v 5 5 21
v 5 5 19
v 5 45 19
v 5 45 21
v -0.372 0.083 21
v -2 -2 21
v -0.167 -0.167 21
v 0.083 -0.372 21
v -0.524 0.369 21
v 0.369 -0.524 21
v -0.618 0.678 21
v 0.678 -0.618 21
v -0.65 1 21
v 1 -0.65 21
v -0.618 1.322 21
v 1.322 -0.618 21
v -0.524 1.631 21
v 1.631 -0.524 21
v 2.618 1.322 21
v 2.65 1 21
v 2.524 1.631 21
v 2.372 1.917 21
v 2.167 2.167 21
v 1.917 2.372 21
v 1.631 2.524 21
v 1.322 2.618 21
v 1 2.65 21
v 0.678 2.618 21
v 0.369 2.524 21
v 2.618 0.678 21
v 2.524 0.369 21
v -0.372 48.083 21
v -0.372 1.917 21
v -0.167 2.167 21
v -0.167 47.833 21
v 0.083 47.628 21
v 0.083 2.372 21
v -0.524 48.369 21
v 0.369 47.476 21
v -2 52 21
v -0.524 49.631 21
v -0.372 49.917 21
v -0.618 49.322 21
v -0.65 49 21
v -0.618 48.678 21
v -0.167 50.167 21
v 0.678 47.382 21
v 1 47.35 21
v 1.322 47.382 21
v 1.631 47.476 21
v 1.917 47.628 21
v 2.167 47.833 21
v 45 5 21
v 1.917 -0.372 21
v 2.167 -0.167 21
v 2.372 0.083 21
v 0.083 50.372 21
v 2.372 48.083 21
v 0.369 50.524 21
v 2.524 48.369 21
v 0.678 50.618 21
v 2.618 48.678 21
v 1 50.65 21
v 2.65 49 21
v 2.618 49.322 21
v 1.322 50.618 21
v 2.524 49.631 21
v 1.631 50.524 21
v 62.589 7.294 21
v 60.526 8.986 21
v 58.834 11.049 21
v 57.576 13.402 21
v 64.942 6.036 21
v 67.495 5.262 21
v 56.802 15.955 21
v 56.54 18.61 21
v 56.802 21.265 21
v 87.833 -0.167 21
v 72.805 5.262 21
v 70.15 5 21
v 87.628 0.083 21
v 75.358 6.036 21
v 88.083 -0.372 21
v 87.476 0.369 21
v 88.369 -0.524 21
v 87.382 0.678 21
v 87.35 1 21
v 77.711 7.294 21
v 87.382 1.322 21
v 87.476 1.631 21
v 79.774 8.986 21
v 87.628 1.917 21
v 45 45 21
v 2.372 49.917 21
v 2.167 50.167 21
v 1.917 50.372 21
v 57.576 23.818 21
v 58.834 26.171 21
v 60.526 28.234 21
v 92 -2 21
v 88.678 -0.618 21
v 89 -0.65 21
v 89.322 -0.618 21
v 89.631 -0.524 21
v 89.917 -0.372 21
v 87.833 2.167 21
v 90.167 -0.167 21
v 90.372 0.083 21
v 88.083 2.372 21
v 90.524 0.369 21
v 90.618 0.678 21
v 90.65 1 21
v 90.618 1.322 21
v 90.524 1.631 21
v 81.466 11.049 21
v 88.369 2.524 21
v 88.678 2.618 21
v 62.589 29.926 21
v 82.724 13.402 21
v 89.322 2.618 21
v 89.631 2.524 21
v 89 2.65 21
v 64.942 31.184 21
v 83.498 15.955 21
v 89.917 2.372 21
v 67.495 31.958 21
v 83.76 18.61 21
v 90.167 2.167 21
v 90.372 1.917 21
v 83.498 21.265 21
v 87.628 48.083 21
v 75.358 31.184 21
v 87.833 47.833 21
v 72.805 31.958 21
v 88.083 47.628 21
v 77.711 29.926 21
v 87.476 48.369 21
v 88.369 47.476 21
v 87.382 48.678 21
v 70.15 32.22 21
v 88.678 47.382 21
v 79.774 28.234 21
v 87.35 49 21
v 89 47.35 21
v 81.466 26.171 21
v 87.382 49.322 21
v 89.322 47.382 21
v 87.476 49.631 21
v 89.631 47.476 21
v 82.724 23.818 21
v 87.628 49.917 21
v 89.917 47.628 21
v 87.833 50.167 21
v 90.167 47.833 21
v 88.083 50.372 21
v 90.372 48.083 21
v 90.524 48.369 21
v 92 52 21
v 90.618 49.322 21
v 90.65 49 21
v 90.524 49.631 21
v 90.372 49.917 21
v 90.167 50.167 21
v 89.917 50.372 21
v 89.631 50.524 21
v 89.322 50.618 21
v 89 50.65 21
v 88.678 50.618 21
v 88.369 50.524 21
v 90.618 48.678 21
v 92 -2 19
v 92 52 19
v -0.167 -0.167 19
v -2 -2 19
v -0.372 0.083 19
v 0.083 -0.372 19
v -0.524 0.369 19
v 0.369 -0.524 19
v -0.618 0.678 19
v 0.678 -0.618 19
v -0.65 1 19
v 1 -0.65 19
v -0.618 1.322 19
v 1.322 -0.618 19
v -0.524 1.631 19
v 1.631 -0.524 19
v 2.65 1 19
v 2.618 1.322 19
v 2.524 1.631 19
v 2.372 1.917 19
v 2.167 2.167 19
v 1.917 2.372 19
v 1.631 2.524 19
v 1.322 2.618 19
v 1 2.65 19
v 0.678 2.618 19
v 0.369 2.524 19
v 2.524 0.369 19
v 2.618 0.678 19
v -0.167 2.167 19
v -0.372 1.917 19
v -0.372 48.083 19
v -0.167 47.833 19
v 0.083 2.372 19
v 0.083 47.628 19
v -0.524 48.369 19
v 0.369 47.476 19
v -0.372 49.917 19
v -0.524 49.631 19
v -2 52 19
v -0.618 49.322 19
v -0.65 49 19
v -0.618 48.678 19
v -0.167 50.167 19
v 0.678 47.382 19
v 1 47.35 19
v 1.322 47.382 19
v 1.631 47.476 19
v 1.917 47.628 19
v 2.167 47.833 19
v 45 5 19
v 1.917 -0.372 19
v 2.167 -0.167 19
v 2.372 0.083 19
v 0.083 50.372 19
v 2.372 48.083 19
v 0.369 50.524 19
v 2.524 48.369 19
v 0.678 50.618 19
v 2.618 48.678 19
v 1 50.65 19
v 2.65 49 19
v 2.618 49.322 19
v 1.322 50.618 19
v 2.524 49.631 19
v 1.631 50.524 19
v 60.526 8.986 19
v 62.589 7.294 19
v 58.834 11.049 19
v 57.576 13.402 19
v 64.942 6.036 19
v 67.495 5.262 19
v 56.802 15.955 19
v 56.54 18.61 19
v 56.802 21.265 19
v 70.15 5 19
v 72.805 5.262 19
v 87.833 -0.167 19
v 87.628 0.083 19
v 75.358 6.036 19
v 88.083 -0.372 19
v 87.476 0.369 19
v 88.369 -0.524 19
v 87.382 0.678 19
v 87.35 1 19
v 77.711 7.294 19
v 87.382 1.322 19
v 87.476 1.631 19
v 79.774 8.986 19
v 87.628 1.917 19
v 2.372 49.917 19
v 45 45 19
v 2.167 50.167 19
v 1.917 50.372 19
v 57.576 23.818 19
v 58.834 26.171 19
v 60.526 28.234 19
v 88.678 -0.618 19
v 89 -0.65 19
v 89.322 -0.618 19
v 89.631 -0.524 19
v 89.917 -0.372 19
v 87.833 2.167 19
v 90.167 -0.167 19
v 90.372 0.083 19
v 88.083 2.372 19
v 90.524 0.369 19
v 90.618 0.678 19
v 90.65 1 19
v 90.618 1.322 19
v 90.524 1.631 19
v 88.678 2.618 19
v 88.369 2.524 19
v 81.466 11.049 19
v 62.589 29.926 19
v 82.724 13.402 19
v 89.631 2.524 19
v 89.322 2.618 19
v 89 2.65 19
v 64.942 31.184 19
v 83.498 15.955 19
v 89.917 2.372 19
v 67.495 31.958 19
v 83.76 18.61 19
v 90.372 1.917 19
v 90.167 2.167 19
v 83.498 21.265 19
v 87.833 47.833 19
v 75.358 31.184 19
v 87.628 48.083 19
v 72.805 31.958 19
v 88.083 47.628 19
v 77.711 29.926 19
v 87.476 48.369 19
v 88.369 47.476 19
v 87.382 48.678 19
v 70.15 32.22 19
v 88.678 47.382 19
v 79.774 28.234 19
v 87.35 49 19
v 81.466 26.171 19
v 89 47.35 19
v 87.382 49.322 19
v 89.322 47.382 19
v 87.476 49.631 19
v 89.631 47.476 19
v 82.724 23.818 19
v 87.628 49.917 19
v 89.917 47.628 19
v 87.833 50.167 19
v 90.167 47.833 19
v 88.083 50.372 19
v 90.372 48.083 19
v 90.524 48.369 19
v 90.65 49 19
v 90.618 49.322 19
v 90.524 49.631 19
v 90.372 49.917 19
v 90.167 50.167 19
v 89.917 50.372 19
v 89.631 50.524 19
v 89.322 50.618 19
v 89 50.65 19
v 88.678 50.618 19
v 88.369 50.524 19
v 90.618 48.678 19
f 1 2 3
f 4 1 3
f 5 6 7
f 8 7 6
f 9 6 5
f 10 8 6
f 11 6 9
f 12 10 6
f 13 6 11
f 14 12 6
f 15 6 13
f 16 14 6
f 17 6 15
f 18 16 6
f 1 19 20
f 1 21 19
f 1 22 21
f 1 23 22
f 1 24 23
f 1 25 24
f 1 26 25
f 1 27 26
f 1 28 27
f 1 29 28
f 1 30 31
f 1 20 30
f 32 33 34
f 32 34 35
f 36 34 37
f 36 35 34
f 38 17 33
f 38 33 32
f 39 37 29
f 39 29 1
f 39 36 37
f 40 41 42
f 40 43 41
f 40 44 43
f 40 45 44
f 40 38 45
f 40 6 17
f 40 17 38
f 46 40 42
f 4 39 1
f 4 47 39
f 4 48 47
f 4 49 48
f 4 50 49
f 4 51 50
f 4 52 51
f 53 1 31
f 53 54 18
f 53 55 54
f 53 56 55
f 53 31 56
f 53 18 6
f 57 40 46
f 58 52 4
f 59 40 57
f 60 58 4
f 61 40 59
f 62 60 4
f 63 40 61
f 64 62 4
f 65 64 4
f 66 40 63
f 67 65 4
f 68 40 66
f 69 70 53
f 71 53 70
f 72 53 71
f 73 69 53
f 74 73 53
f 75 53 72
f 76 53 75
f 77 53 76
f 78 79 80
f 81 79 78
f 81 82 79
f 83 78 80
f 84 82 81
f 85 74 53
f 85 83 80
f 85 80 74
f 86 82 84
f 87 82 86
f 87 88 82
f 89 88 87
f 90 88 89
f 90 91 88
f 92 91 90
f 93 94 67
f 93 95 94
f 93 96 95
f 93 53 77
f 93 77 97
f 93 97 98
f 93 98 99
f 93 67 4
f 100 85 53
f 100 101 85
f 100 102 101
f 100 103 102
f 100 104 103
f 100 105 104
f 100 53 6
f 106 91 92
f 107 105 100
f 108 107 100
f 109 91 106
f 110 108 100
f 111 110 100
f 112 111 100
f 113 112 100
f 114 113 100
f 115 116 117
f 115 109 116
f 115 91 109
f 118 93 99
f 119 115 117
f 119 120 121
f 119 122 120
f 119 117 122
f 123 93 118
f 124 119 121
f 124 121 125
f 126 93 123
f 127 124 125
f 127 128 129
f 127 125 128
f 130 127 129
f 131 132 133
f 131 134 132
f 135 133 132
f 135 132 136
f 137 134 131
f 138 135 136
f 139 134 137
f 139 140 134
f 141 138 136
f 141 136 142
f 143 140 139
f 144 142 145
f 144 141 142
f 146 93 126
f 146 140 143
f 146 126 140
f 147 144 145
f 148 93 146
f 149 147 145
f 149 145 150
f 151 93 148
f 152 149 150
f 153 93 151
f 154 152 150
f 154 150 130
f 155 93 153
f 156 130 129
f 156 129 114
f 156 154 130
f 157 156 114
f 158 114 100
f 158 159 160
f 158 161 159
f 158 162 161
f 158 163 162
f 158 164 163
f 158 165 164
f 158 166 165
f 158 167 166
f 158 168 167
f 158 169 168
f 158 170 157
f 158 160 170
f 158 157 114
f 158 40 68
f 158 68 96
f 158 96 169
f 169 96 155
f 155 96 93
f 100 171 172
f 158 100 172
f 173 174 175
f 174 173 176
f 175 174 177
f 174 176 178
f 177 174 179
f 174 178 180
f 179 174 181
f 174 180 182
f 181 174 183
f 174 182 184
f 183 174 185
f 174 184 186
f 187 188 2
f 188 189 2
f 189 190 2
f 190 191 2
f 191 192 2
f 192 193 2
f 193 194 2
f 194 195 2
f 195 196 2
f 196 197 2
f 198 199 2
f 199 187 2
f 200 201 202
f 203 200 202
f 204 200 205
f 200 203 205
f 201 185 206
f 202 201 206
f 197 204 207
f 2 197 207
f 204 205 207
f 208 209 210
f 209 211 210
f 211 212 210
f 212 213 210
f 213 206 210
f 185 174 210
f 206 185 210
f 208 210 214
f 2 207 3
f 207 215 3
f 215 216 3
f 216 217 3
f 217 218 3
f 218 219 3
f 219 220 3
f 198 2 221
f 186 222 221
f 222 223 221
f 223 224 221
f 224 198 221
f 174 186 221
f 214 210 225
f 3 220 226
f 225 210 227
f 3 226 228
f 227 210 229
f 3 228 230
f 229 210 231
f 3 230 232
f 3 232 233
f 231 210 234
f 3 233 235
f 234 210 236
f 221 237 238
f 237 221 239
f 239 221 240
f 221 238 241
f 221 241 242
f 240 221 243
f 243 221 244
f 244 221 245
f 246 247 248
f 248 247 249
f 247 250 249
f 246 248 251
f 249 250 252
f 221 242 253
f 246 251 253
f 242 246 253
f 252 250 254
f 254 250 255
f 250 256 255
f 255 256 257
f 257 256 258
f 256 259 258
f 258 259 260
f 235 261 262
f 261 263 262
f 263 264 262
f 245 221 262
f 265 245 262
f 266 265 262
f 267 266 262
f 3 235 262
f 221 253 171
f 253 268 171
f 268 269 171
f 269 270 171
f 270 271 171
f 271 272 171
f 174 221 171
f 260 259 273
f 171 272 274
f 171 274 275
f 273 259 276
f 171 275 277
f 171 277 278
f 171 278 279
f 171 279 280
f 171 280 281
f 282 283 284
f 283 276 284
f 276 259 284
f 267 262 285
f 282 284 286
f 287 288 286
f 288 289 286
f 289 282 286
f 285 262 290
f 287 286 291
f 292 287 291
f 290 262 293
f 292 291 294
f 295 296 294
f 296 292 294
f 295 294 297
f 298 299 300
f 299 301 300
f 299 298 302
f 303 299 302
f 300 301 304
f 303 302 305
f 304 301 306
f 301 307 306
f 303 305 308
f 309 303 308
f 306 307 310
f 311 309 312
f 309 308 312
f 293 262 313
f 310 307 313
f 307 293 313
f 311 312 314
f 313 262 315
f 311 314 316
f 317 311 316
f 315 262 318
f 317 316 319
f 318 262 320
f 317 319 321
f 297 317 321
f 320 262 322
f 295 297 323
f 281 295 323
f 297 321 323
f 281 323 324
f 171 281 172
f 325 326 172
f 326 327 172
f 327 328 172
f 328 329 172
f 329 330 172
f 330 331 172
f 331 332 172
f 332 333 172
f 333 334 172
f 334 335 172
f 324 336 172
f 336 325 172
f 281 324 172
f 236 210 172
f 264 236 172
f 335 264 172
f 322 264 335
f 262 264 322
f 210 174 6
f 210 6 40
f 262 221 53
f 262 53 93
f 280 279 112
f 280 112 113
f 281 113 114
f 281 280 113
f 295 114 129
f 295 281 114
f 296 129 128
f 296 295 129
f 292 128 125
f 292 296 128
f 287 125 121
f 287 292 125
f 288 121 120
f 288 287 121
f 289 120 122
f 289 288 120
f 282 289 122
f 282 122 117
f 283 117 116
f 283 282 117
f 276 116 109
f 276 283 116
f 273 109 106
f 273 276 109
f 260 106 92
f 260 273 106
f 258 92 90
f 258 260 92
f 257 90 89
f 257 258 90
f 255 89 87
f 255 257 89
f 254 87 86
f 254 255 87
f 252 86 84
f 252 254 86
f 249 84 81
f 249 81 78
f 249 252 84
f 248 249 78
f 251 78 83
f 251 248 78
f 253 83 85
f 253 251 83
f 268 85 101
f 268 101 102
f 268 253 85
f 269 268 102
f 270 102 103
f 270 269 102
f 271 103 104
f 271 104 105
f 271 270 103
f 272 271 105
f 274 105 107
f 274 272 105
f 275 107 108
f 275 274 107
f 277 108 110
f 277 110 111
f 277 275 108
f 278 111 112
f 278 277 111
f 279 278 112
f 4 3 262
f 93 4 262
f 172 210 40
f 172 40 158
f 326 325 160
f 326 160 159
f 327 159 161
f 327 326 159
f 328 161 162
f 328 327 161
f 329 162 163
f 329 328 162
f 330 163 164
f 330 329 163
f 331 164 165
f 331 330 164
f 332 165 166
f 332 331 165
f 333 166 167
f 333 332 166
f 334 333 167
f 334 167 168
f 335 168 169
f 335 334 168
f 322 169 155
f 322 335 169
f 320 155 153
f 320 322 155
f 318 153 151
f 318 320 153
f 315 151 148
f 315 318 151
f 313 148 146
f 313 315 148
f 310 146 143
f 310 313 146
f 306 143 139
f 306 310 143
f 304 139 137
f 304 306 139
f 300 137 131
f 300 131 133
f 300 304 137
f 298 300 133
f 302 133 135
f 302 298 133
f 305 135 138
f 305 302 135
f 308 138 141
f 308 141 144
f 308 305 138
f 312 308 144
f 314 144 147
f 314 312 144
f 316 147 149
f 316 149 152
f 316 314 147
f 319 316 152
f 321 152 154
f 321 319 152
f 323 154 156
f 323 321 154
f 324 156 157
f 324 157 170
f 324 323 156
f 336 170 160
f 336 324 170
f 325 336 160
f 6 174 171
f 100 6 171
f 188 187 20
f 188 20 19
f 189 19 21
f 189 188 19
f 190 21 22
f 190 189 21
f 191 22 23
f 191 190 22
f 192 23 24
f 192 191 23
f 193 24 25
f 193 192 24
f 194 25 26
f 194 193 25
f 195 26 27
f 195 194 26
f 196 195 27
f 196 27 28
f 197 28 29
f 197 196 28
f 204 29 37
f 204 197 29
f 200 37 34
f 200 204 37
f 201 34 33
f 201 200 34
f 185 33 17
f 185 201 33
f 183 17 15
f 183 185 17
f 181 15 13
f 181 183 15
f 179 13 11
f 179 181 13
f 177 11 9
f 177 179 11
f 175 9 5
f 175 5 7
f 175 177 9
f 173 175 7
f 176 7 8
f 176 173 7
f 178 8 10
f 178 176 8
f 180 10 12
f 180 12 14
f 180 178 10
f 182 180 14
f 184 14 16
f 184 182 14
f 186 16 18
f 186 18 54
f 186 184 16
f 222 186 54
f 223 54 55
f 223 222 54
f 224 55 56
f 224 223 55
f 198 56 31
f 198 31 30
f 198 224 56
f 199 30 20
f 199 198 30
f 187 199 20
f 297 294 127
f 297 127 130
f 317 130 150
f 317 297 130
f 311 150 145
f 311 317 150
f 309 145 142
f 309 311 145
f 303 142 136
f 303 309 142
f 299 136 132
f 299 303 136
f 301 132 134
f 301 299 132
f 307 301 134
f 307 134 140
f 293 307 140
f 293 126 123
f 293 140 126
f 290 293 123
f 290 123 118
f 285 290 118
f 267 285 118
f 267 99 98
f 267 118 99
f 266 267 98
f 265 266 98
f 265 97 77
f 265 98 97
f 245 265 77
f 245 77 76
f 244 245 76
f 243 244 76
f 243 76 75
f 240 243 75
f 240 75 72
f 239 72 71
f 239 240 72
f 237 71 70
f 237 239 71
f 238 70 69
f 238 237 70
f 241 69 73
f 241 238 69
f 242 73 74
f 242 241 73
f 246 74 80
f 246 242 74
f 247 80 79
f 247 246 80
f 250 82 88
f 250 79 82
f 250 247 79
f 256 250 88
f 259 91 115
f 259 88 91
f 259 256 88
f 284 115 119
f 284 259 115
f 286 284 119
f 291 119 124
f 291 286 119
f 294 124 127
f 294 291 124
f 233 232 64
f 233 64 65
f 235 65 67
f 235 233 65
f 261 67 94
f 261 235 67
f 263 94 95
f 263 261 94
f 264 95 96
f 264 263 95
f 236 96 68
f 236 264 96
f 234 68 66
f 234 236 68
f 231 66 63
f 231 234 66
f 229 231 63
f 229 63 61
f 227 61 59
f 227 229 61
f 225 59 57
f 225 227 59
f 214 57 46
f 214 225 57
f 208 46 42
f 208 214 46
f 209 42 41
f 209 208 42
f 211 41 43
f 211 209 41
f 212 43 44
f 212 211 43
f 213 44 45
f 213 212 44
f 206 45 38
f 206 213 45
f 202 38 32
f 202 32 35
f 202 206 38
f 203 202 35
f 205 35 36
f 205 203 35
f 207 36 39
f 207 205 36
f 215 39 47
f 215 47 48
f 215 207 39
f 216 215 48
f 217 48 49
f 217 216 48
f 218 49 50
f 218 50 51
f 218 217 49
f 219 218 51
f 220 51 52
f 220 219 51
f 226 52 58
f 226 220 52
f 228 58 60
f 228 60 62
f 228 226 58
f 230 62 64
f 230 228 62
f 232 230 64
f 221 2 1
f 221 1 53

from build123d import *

# Parameters (mm, degrees)
SKETCH018_R      = 11
EXTRUDE016_DEPTH = 11
SKETCH015_W      = 33.86
SKETCH015_H      = 26.75
SKETCH015_R      = 1.65
EXTRUDE017_DEPTH = 1.6
SKETCH016_W      = 17
SKETCH016_H      = 12.75
EXTRUDE018_DEPTH = 4.3
SKETCH017_R      = 13.61
EXTRUDE015_DEPTH = 19.27
SKETCH028_W      = 94
SKETCH028_H      = 54
SKETCH028_R      = 1.65
SKETCH028_W_2    = 40
SKETCH028_H_2    = 40
EXTRUDE028_DEPTH = 2


with BuildPart() as extrude_joystick_stick:
    # Sketch018 → Extrude016 (new body)
    with BuildSketch(Plane.XY):
        with Locations((16.975, 14)):
            Circle(SKETCH018_R)
    extrude(amount=EXTRUDE016_DEPTH)


with BuildPart() as extrude_joystick_stick_1:
    # Extrude016 placement: moved
    add(extrude_joystick_stick.part.moved(Location((0, 0, 20.87))))


with BuildPart() as extrude_joystick_base:
    # Sketch015 → Extrude017 (new body)
    with BuildSketch(Plane.XY):
        with Locations((16.93, 13.375)):
            Rectangle(SKETCH015_W, SKETCH015_H)
        with Locations((5, 22.88)):
            Circle(SKETCH015_R, mode=Mode.SUBTRACT)
        with Locations((31.01, 22.88)):
            Circle(SKETCH015_R, mode=Mode.SUBTRACT)
        with Locations((4.99, 3.31)):
            Circle(SKETCH015_R, mode=Mode.SUBTRACT)
        with Locations((31.01, 3.31)):
            Circle(SKETCH015_R, mode=Mode.SUBTRACT)
    extrude(amount=EXTRUDE017_DEPTH)


with BuildPart() as extrude_joystick_connector:
    # Sketch016 → Extrude018 (new body)
    with BuildSketch(Plane.XY):
        with Locations((-8.5, 13.875)):
            Rectangle(SKETCH016_W, SKETCH016_H)
    extrude(amount=EXTRUDE018_DEPTH)


with BuildPart() as extrude_joystick_connector_1:
    # Extrude018 placement: moved
    add(extrude_joystick_connector.part.moved(Location((0.1, 0, 1.6))))


with BuildPart() as fusion_joystick_connector001:
    # Sketch017 → Extrude015 (new body)
    with BuildSketch(Plane.XY):
        with Locations((17.15, 13.61)):
            Circle(SKETCH017_R)
    extrude(amount=EXTRUDE015_DEPTH)


with BuildPart() as fusion_joystick_connector001_1:
    # Extrude015 placement: moved
    add(fusion_joystick_connector001.part.moved(Location((0, 0, 1.6))))

    # Fusion005: union Extrude_JoyStick_Stick, Extrude_JoyStick_base, Extrude_JoyStick_connector
    add(extrude_joystick_stick_1.part)
    add(extrude_joystick_base.part)
    add(extrude_joystick_connector_1.part)


with BuildPart() as fusion_joystick_connector001_2:
    # Fusion005 placement: moved
    add(fusion_joystick_connector001_1.part.moved(Location((53, 5, 5))))


with BuildPart() as cut_controllercase_top:
    # Sketch028 → Extrude028 (new body)
    with BuildSketch(Plane.XY):
        with Locations((45, 25)):
            Rectangle(SKETCH028_W, SKETCH028_H)
        with Locations((1, 49)):
            Circle(SKETCH028_R, mode=Mode.SUBTRACT)
        with Locations((89, 49)):
            Circle(SKETCH028_R, mode=Mode.SUBTRACT)
        with Locations((89, 1)):
            Circle(SKETCH028_R, mode=Mode.SUBTRACT)
        with Locations((1, 1)):
            Circle(SKETCH028_R, mode=Mode.SUBTRACT)
        with Locations((25, 25)):
            Rectangle(SKETCH028_W_2, SKETCH028_H_2, mode=Mode.SUBTRACT)
    extrude(amount=EXTRUDE028_DEPTH)


with BuildPart() as cut_controllercase_top_1:
    # Extrude028 placement: moved
    add(cut_controllercase_top.part.moved(Location((0, 0, 19))))

    # Cut003: cut Fusion_JoyStick_connector001
    add(fusion_joystick_connector001_2.part, mode=Mode.SUBTRACT)


solid = cut_controllercase_top_1.part
